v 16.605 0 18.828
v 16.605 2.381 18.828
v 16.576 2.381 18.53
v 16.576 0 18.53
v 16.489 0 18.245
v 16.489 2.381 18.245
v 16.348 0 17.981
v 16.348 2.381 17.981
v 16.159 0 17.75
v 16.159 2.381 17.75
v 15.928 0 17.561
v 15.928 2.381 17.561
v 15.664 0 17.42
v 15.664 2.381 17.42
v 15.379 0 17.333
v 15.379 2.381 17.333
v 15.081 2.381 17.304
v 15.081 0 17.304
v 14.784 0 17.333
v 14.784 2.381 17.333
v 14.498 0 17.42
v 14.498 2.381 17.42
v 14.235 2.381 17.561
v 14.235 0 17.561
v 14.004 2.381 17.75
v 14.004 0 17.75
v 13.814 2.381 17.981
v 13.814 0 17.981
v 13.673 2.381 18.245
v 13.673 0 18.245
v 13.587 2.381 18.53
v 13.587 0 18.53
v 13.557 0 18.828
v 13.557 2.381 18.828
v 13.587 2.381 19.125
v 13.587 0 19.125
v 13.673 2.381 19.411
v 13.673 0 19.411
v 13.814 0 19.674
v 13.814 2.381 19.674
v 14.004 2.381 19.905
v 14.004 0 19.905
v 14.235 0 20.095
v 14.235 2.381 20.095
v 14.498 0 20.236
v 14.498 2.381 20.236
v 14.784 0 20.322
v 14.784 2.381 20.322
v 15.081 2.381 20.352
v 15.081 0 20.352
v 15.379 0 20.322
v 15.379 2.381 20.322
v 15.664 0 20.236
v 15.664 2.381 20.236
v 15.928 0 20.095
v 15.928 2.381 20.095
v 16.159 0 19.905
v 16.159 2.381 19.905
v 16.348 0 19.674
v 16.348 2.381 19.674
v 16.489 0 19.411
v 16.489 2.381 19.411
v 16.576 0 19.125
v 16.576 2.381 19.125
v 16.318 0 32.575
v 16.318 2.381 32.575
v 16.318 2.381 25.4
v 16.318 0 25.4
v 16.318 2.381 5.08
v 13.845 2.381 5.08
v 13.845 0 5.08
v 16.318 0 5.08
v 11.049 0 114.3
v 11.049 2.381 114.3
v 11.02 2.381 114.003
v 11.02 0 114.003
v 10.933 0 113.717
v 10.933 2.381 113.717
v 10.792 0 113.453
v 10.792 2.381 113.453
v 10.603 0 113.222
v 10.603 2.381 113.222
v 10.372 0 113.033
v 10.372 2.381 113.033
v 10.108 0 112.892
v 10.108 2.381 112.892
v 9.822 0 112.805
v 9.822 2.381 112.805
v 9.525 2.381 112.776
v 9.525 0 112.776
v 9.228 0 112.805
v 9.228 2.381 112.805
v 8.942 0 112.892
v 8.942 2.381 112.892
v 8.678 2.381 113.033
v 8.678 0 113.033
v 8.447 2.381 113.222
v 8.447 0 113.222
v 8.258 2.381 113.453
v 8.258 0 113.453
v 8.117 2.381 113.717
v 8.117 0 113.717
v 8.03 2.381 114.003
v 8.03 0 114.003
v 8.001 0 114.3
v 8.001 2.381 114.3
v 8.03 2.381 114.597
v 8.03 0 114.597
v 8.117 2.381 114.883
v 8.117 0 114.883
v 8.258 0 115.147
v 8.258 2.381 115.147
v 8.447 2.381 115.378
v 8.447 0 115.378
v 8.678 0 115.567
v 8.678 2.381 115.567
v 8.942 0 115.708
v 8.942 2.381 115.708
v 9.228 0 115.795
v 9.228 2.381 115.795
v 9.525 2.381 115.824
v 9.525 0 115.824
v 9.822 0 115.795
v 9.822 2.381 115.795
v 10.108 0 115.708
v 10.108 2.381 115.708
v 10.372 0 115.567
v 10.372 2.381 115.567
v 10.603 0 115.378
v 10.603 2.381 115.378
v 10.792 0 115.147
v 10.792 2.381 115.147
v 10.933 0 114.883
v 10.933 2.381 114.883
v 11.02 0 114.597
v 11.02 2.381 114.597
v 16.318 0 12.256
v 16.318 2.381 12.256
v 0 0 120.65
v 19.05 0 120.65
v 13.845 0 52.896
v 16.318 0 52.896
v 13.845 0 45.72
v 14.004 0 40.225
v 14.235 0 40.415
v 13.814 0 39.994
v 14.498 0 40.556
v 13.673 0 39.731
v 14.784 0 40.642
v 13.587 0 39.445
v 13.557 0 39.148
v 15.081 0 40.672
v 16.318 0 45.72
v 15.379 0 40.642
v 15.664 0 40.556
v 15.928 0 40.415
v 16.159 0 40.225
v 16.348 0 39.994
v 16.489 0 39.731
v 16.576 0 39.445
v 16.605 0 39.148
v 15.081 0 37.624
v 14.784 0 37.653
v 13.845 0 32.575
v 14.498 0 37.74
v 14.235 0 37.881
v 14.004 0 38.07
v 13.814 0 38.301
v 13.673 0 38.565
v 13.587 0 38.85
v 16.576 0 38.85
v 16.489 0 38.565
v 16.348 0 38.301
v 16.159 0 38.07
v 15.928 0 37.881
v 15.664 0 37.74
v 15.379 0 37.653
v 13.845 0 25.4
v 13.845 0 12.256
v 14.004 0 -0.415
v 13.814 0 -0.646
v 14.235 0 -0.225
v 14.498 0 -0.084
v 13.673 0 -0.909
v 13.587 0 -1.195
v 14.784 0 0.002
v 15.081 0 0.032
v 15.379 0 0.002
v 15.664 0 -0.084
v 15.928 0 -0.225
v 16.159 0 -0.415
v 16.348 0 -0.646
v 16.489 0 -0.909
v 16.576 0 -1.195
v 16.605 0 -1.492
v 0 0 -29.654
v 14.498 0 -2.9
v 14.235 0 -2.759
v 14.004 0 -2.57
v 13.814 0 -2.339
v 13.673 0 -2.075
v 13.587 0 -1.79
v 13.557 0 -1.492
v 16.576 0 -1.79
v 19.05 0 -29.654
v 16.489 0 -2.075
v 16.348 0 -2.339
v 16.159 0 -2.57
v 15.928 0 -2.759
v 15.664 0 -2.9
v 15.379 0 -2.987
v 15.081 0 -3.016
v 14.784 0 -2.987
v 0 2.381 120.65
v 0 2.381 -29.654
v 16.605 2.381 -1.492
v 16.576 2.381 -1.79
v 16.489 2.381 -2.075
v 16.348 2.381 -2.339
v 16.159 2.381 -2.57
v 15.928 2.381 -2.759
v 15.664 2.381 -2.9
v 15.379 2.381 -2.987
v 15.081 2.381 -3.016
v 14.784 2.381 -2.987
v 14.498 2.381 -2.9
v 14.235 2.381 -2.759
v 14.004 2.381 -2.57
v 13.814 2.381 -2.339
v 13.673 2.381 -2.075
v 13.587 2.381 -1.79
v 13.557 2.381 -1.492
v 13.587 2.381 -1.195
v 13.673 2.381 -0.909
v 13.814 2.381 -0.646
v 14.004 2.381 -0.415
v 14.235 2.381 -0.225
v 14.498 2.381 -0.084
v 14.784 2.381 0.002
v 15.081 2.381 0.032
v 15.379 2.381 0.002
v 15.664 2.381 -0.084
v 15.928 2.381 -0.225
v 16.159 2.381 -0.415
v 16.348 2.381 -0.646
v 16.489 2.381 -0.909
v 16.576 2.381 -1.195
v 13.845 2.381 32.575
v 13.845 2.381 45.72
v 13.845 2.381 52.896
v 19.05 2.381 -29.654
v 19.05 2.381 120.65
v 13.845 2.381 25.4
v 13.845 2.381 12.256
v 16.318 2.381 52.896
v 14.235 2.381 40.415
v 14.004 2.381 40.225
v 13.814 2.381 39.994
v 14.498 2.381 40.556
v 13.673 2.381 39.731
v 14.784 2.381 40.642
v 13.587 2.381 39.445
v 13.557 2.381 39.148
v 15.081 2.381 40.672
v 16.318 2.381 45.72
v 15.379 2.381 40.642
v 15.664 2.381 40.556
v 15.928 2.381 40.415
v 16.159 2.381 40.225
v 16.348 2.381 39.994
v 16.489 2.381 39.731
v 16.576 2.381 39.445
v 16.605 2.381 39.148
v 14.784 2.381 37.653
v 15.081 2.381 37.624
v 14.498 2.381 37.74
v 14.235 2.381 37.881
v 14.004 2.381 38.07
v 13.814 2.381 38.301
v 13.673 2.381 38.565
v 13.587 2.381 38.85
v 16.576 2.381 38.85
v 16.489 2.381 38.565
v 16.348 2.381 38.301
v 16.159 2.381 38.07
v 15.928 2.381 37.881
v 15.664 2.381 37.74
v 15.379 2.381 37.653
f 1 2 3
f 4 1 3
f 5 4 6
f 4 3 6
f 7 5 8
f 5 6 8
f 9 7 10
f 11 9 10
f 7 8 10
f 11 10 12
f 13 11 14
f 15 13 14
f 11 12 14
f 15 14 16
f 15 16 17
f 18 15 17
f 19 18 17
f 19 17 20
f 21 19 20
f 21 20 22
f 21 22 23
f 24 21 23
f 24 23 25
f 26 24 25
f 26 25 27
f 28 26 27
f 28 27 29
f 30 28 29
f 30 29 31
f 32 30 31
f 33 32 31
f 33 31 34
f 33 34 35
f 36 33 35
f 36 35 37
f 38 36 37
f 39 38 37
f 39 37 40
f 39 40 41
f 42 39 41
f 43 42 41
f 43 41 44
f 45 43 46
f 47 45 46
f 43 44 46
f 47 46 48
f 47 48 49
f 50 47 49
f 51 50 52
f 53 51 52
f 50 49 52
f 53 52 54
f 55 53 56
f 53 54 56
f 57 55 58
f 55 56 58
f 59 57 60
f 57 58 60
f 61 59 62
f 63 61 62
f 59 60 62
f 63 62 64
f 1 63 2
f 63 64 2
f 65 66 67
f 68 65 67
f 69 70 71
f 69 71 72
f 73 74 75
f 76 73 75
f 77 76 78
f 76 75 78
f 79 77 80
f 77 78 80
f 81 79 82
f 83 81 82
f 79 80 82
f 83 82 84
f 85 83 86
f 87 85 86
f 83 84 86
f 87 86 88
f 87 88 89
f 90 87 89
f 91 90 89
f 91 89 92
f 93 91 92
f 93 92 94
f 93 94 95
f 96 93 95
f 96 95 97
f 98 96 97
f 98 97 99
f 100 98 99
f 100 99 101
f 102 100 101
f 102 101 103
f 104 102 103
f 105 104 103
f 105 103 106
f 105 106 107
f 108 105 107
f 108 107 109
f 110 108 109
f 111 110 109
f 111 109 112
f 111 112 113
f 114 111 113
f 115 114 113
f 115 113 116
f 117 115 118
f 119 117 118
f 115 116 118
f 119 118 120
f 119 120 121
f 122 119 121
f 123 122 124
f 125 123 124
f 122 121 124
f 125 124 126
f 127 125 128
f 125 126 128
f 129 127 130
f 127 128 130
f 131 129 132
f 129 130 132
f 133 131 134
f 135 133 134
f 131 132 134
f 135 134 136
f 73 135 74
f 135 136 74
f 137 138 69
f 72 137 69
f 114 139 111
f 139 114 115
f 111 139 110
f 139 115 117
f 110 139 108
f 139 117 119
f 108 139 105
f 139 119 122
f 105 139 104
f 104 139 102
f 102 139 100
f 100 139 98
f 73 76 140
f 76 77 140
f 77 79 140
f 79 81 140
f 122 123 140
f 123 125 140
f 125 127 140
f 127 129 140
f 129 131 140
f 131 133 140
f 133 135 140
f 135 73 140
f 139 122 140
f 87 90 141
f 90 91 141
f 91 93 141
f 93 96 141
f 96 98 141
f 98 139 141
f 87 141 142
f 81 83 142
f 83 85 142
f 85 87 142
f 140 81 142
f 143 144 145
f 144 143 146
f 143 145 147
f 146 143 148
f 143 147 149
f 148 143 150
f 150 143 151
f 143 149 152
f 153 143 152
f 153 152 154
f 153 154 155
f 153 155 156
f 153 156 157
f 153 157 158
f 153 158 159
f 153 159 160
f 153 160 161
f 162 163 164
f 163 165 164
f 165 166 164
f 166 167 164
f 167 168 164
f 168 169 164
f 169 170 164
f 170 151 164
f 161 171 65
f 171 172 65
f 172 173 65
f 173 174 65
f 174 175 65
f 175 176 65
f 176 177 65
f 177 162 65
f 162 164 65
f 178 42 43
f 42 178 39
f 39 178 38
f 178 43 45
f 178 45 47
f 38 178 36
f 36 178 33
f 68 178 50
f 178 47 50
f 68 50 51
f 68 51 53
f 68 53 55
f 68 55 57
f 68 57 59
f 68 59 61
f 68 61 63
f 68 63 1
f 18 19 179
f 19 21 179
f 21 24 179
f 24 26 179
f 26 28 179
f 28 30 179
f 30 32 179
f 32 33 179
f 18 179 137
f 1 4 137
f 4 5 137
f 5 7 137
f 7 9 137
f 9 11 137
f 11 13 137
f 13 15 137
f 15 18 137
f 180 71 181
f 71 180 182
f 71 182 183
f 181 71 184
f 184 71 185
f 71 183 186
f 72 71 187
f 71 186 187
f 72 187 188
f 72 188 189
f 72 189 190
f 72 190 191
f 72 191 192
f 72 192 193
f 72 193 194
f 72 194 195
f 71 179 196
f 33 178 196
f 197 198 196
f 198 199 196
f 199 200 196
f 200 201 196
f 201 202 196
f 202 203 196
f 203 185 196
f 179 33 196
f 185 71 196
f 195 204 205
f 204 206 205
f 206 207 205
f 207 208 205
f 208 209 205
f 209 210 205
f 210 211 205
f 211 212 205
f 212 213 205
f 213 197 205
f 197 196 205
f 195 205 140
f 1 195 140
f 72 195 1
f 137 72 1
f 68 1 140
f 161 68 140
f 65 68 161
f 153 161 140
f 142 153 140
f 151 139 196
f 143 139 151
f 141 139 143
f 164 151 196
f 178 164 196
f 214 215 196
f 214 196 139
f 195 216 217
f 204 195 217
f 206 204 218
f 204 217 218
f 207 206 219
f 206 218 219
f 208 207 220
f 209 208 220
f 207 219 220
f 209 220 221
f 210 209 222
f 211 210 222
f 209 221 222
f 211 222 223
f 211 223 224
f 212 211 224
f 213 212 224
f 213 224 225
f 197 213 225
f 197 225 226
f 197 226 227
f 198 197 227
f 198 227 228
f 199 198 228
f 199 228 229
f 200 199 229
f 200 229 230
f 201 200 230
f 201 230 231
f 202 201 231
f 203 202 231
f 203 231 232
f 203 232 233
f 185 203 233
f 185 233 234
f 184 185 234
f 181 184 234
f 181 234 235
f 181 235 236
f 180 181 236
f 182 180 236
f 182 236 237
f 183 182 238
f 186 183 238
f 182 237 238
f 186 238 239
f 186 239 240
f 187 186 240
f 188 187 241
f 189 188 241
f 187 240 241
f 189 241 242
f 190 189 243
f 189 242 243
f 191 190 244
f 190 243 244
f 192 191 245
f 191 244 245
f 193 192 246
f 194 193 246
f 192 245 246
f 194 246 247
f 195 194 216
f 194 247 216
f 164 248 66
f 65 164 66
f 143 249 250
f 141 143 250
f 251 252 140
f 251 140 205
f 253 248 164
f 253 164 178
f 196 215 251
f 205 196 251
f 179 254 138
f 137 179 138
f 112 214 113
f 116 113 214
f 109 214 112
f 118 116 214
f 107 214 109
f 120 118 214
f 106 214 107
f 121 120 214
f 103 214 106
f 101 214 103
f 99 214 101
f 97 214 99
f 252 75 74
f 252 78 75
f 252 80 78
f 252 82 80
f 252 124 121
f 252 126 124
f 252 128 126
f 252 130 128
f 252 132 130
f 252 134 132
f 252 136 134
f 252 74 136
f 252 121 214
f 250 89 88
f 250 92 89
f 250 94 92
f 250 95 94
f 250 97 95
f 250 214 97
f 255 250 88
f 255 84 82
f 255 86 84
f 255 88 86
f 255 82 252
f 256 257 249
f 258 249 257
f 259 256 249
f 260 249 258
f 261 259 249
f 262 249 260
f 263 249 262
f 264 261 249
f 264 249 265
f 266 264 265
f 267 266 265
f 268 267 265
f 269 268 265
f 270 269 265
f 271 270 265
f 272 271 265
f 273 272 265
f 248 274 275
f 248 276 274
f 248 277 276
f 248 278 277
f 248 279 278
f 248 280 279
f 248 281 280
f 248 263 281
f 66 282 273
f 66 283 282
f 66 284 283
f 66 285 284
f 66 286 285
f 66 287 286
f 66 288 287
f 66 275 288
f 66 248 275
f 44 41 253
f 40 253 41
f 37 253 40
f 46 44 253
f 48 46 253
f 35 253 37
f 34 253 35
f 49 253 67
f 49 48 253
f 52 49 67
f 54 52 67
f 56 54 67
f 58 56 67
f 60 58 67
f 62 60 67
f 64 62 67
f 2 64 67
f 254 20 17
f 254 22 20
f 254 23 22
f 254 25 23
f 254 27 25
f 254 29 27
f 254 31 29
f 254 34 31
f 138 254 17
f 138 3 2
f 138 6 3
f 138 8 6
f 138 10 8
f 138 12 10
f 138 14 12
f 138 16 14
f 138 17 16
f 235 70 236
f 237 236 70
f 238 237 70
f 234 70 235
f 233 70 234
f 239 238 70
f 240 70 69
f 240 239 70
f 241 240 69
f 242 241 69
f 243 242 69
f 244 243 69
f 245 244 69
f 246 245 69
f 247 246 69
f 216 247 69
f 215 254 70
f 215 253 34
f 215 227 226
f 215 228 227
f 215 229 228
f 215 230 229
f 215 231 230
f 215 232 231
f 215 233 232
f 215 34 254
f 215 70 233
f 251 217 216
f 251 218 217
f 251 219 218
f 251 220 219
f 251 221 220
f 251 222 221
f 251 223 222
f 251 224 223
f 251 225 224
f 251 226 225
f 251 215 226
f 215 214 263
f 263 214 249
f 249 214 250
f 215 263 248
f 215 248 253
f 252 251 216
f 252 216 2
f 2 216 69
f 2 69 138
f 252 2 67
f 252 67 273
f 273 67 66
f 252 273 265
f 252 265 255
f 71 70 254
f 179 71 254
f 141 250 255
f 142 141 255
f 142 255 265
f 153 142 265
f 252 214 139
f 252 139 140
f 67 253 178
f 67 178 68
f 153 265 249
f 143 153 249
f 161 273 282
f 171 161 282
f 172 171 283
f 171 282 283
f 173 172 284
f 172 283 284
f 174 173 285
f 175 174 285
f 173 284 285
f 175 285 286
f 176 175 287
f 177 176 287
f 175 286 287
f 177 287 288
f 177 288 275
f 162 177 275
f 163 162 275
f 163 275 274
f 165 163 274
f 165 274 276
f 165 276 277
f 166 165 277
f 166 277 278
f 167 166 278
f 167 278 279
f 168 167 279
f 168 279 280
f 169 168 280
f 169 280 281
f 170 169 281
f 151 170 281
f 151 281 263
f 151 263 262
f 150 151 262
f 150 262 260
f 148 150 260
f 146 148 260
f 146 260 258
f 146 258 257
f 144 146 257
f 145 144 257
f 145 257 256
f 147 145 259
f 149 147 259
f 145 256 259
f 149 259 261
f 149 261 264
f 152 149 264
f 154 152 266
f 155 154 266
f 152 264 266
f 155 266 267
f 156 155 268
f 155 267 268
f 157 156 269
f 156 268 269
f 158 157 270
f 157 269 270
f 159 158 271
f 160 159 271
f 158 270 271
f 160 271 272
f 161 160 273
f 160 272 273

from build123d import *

# Parameters (mm, degrees)
SKETCH1_W           = 19.05
SKETCH1_H           = 2.38125
BOSS_EXTRUDE1_DEPTH = 88.9
SKETCH5_R           = 1.524
CUT_EXTRUDE4_DEPTH  = 3.38125
SKETCH9_W           = 19.05
SKETCH9_H           = 29.6545
BOSS_EXTRUDE4_DEPTH = 2.38125
SKETCH10_W          = 2.47269
SKETCH10_H          = 3.58775
SKETCH10_R          = 1.524
CUT_EXTRUDE5_DEPTH  = 3.38125
BOSS_EXTRUDE5_DEPTH = 2.38125
SKETCH11_R          = 1.524
CUT_EXTRUDE6_DEPTH  = 3.38125


with BuildPart() as part:
    # Sketch1 → Boss-Extrude1 (new body)
    with BuildSketch(Plane.XY):
        with Locations((9.525, 1.190625)):
            Rectangle(SKETCH1_W, SKETCH1_H)
    extrude(amount=BOSS_EXTRUDE1_DEPTH)

    # Sketch5 → Cut-Extrude4 (cut, through all)
    with BuildSketch(Plane(origin=(0, 2.38125, 0), x_dir=(1, 0, 0), z_dir=(0, 1, 0))):
        with Locations((15.08125, -39.14775)):
            Circle(SKETCH5_R)
        with Locations((15.08125, -18.82775)):
            Circle(SKETCH5_R)
        Polygon((16.317595, -28.98775), (16.317595, -32.5755), (15.08125, -32.5755), (13.844905, -32.5755), (13.844905, -25.4), (16.317595, -25.4), align=None)
        Polygon((15.08125, -52.8955), (16.317595, -52.8955), (16.317595, -45.72), (13.844905, -45.72), (13.844905, -52.8955), align=None)
    extrude(amount=-CUT_EXTRUDE4_DEPTH, mode=Mode.SUBTRACT)

    # Sketch9 → Boss-Extrude4 (add)
    with BuildSketch(Plane(origin=(0, 2.38125, 0), x_dir=(1, 0, 0), z_dir=(0, 1, 0))):
        with Locations((9.525, 14.82725)):
            Rectangle(SKETCH9_W, SKETCH9_H)
    extrude(amount=-BOSS_EXTRUDE4_DEPTH)

    # Sketch10 → Cut-Extrude5 (cut, through all)
    with BuildSketch(Plane(origin=(0, 2.38125, 0), x_dir=(1, 0, 0), z_dir=(0, 1, 0))):
        with Locations((15.08125, -6.873875)):
            Rectangle(SKETCH10_W, SKETCH10_H)
        with Locations((15.08125, -10.461625)):
            Rectangle(SKETCH10_W, SKETCH10_H)
        with Locations((15.08125, 1.49225)):
            Circle(SKETCH10_R)
    extrude(amount=-CUT_EXTRUDE5_DEPTH, mode=Mode.SUBTRACT)

    # Sketch8 → Boss-Extrude5 (add)
    with BuildSketch(Plane(origin=(0, 2.38125, 0), x_dir=(1, 0, 0), z_dir=(0, 1, 0))):
        Polygon((19.05, -88.9), (0, -88.9), (0, -114.3), (0, -120.65), (19.05, -120.65), (19.05, -114.3), align=None)
    extrude(amount=-BOSS_EXTRUDE5_DEPTH)

    # Sketch11 → Cut-Extrude6 (cut, through all)
    with BuildSketch(Plane(origin=(0, 2.38125, 0), x_dir=(1, 0, 0), z_dir=(0, 1, 0))):
        with Locations((9.525, -114.3)):
            Circle(SKETCH11_R)
    extrude(amount=-CUT_EXTRUDE6_DEPTH, mode=Mode.SUBTRACT)


solid = part.part
